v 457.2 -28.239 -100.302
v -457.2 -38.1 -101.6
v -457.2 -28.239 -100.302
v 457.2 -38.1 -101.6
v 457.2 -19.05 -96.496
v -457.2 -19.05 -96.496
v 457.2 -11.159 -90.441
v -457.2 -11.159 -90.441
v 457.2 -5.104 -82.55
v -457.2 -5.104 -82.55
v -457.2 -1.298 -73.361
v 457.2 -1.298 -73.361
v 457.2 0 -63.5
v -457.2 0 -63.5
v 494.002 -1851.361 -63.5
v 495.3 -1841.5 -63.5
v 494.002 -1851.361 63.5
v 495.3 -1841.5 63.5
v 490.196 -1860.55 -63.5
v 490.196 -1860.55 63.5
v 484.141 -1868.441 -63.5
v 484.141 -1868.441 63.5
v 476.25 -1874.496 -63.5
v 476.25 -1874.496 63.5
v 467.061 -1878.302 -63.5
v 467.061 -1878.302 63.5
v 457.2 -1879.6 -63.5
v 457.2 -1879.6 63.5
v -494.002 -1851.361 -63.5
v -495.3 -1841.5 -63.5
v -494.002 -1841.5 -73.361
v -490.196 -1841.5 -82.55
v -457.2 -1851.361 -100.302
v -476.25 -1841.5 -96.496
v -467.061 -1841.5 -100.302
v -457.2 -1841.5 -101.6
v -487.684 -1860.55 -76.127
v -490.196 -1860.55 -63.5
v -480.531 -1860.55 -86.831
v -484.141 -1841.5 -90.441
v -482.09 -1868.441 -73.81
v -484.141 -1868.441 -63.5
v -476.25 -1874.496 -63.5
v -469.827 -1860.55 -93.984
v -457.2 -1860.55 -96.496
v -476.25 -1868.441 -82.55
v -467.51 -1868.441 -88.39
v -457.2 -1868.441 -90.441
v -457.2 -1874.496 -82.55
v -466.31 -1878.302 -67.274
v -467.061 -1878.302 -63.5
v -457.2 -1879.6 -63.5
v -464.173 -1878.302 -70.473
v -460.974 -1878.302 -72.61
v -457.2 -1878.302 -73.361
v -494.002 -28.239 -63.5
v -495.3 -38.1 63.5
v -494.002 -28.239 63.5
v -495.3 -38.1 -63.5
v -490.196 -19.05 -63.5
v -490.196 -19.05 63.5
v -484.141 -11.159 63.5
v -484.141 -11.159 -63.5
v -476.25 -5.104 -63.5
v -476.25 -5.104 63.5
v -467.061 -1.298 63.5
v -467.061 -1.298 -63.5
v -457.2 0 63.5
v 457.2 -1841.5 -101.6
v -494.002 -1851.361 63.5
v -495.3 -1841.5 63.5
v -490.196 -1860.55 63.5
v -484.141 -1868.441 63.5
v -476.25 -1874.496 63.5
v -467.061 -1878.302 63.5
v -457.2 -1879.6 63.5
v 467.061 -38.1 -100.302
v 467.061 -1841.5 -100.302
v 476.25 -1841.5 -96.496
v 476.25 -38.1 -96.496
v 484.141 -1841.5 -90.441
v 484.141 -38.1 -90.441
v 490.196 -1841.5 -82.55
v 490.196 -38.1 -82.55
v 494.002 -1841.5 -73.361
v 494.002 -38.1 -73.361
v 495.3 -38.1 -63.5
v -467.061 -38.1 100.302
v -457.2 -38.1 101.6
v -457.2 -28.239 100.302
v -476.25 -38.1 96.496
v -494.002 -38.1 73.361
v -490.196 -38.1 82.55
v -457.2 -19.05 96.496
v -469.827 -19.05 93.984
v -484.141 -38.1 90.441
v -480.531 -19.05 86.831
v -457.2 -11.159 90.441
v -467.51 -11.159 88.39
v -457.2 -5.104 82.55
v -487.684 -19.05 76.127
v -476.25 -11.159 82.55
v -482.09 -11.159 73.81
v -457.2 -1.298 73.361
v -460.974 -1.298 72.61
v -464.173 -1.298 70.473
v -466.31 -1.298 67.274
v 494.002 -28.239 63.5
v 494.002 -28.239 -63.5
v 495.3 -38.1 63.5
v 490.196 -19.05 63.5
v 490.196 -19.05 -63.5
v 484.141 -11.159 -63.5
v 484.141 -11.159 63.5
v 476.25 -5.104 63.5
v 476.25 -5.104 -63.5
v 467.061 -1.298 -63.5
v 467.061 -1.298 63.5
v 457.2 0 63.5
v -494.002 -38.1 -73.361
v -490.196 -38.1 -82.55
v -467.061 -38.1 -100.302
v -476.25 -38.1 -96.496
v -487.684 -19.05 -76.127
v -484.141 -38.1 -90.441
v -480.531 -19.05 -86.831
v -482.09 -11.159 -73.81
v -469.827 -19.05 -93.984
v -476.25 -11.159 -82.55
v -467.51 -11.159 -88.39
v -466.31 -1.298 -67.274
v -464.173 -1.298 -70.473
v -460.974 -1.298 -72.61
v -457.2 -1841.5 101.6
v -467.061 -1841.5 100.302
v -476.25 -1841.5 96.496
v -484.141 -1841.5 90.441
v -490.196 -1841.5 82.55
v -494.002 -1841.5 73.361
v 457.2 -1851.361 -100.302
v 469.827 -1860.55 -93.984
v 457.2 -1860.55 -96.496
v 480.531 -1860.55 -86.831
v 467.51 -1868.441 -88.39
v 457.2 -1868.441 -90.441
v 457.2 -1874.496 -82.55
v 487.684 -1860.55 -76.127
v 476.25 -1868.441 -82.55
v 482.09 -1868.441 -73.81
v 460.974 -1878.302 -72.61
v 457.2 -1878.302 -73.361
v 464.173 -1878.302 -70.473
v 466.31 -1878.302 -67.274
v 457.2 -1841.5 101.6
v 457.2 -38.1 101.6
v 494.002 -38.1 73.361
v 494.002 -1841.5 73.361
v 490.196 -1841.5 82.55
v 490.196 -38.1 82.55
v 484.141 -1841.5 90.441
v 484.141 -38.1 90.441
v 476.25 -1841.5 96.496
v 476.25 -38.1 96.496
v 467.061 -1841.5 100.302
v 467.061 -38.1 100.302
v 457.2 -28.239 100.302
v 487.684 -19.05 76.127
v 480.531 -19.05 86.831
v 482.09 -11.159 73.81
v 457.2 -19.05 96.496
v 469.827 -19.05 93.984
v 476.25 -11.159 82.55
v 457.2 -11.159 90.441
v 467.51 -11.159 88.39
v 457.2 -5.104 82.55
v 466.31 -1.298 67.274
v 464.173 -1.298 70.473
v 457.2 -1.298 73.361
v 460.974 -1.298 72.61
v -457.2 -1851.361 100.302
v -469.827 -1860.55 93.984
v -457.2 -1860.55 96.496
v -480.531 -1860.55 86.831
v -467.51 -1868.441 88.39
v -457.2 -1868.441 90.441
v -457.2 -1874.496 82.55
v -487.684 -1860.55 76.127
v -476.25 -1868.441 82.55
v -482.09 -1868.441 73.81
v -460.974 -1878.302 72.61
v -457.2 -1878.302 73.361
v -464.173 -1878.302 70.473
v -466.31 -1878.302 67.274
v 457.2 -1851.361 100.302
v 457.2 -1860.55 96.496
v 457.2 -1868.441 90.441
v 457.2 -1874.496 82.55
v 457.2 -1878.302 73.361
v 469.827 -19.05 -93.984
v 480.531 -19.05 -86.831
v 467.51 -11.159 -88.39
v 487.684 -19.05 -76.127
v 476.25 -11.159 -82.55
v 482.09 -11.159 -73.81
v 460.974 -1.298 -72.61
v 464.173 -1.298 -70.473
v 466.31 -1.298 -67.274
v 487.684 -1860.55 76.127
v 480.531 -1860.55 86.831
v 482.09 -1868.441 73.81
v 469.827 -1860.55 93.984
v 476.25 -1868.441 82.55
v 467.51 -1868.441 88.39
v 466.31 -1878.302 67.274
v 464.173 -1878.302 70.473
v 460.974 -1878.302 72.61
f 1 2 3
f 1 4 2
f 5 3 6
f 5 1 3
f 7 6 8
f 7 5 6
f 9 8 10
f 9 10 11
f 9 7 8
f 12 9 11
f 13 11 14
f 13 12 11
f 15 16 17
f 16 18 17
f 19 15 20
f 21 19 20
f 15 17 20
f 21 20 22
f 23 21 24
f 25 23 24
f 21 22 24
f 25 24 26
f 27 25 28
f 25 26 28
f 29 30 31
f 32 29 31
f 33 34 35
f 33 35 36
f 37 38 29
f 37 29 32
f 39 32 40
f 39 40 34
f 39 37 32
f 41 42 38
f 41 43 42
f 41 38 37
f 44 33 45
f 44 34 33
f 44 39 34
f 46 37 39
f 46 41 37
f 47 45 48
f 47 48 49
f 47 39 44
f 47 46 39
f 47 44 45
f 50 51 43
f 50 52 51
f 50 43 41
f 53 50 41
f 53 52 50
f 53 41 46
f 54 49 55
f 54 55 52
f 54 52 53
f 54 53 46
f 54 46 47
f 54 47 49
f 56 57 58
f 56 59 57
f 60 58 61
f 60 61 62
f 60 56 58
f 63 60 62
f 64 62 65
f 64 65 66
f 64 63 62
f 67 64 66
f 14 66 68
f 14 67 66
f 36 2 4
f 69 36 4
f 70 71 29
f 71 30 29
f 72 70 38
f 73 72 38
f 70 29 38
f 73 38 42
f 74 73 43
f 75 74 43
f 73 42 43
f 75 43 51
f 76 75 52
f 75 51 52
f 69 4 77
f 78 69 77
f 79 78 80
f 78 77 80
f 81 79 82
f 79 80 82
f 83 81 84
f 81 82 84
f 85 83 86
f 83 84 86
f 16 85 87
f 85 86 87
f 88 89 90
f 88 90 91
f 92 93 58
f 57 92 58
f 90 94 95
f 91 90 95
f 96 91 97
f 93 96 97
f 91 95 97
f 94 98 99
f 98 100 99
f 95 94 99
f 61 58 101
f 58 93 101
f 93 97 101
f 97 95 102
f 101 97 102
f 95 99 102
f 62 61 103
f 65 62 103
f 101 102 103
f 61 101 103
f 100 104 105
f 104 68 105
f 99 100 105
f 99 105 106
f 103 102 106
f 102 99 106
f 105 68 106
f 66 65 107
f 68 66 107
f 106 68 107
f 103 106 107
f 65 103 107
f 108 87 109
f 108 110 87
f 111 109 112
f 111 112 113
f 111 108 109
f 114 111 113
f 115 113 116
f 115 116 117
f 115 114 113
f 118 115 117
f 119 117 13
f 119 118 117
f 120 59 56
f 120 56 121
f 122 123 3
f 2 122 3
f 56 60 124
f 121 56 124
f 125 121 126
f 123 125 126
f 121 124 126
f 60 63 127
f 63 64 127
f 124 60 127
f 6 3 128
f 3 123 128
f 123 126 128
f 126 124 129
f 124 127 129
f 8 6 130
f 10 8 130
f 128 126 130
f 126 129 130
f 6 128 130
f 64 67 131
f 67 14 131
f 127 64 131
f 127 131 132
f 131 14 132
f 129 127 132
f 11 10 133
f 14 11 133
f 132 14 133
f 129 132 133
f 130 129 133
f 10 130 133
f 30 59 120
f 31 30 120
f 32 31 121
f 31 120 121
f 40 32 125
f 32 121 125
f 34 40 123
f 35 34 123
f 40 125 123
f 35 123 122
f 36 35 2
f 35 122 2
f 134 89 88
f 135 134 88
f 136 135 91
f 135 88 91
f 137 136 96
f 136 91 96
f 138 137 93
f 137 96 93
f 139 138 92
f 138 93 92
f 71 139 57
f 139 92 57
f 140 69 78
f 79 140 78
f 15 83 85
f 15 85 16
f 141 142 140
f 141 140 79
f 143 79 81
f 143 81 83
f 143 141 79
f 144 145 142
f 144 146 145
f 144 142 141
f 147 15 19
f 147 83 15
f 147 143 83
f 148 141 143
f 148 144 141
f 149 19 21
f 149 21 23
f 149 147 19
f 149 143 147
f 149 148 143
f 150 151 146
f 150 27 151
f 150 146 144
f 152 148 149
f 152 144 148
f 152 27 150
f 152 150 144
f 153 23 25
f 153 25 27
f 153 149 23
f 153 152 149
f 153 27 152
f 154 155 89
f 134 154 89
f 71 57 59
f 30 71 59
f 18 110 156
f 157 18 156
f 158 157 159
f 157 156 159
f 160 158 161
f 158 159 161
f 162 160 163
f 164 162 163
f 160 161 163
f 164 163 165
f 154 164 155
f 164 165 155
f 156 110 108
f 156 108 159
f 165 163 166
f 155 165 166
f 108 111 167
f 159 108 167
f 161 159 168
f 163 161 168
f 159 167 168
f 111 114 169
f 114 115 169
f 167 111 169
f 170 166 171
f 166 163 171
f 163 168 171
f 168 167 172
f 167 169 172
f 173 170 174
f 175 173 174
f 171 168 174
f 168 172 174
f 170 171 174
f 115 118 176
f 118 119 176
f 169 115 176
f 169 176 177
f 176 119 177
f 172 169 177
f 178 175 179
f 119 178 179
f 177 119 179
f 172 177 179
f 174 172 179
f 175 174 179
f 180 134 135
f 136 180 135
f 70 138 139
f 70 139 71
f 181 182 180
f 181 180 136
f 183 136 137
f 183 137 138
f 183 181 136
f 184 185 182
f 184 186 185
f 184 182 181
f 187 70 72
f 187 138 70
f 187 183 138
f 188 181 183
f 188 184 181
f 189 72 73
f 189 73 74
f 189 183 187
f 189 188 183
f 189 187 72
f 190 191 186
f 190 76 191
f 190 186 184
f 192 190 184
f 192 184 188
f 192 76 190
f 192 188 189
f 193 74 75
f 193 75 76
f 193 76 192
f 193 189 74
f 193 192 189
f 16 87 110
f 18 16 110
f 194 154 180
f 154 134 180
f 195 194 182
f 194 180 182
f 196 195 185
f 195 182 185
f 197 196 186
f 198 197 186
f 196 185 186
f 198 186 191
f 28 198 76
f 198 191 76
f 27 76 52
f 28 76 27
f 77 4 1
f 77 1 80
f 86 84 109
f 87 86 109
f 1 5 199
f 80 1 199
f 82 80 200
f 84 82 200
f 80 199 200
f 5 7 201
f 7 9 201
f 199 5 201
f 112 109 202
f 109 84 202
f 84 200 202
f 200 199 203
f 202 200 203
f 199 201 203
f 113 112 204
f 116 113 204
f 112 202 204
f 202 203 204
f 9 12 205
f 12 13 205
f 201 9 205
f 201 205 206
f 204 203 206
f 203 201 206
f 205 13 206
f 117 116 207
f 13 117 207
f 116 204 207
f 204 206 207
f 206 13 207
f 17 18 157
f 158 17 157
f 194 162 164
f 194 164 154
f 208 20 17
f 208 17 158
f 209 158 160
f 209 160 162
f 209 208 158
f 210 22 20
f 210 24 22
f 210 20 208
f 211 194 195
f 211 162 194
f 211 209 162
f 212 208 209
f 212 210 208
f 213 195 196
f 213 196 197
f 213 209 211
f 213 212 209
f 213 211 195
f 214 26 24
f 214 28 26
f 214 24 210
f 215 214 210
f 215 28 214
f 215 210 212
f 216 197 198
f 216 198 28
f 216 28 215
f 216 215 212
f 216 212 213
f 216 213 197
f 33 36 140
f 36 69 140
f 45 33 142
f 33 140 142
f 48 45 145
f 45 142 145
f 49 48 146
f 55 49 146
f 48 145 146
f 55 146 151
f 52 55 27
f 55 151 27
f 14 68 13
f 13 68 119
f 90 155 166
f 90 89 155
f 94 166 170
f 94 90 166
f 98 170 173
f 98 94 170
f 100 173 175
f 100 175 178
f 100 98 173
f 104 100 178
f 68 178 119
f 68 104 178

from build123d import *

# Parameters (mm, degrees)
F1_DEPTH = 1879.6
F2_R     = 38.1


with BuildPart() as f1:
    # F0 (on Front) → F1 (new body)
    with BuildSketch(Plane.XZ):
        with BuildLine():
            Line((-457.2, -101.6), (457.2, -101.6))
            ThreePointArc((457.2, -101.6), (484.140768, -90.440768), (495.3, -63.5))
            Line((495.3, -63.5), (495.3, 63.5))
            ThreePointArc((495.3, 63.5), (484.140768, 90.440768), (457.2, 101.6))
            Line((457.2, 101.6), (-457.2, 101.6))
            ThreePointArc((-457.2, 101.6), (-484.140768, 90.440768), (-495.3, 63.5))
            Line((-495.3, 63.5), (-495.3, -63.5))
            ThreePointArc((-495.3, -63.5), (-484.140768, -90.440768), (-457.2, -101.6))
        make_face()
    extrude(amount=F1_DEPTH)

    # F2
    f2_edges = [f1.edges().sort_by_distance(p)[0] for p in [
        (495.3, -1879.6, 0),
        (457.2, -939.8, 101.6),
        (495.3, 0, 0),
    ]]
    fillet(f2_edges, radius=F2_R)


solid = f1.part
